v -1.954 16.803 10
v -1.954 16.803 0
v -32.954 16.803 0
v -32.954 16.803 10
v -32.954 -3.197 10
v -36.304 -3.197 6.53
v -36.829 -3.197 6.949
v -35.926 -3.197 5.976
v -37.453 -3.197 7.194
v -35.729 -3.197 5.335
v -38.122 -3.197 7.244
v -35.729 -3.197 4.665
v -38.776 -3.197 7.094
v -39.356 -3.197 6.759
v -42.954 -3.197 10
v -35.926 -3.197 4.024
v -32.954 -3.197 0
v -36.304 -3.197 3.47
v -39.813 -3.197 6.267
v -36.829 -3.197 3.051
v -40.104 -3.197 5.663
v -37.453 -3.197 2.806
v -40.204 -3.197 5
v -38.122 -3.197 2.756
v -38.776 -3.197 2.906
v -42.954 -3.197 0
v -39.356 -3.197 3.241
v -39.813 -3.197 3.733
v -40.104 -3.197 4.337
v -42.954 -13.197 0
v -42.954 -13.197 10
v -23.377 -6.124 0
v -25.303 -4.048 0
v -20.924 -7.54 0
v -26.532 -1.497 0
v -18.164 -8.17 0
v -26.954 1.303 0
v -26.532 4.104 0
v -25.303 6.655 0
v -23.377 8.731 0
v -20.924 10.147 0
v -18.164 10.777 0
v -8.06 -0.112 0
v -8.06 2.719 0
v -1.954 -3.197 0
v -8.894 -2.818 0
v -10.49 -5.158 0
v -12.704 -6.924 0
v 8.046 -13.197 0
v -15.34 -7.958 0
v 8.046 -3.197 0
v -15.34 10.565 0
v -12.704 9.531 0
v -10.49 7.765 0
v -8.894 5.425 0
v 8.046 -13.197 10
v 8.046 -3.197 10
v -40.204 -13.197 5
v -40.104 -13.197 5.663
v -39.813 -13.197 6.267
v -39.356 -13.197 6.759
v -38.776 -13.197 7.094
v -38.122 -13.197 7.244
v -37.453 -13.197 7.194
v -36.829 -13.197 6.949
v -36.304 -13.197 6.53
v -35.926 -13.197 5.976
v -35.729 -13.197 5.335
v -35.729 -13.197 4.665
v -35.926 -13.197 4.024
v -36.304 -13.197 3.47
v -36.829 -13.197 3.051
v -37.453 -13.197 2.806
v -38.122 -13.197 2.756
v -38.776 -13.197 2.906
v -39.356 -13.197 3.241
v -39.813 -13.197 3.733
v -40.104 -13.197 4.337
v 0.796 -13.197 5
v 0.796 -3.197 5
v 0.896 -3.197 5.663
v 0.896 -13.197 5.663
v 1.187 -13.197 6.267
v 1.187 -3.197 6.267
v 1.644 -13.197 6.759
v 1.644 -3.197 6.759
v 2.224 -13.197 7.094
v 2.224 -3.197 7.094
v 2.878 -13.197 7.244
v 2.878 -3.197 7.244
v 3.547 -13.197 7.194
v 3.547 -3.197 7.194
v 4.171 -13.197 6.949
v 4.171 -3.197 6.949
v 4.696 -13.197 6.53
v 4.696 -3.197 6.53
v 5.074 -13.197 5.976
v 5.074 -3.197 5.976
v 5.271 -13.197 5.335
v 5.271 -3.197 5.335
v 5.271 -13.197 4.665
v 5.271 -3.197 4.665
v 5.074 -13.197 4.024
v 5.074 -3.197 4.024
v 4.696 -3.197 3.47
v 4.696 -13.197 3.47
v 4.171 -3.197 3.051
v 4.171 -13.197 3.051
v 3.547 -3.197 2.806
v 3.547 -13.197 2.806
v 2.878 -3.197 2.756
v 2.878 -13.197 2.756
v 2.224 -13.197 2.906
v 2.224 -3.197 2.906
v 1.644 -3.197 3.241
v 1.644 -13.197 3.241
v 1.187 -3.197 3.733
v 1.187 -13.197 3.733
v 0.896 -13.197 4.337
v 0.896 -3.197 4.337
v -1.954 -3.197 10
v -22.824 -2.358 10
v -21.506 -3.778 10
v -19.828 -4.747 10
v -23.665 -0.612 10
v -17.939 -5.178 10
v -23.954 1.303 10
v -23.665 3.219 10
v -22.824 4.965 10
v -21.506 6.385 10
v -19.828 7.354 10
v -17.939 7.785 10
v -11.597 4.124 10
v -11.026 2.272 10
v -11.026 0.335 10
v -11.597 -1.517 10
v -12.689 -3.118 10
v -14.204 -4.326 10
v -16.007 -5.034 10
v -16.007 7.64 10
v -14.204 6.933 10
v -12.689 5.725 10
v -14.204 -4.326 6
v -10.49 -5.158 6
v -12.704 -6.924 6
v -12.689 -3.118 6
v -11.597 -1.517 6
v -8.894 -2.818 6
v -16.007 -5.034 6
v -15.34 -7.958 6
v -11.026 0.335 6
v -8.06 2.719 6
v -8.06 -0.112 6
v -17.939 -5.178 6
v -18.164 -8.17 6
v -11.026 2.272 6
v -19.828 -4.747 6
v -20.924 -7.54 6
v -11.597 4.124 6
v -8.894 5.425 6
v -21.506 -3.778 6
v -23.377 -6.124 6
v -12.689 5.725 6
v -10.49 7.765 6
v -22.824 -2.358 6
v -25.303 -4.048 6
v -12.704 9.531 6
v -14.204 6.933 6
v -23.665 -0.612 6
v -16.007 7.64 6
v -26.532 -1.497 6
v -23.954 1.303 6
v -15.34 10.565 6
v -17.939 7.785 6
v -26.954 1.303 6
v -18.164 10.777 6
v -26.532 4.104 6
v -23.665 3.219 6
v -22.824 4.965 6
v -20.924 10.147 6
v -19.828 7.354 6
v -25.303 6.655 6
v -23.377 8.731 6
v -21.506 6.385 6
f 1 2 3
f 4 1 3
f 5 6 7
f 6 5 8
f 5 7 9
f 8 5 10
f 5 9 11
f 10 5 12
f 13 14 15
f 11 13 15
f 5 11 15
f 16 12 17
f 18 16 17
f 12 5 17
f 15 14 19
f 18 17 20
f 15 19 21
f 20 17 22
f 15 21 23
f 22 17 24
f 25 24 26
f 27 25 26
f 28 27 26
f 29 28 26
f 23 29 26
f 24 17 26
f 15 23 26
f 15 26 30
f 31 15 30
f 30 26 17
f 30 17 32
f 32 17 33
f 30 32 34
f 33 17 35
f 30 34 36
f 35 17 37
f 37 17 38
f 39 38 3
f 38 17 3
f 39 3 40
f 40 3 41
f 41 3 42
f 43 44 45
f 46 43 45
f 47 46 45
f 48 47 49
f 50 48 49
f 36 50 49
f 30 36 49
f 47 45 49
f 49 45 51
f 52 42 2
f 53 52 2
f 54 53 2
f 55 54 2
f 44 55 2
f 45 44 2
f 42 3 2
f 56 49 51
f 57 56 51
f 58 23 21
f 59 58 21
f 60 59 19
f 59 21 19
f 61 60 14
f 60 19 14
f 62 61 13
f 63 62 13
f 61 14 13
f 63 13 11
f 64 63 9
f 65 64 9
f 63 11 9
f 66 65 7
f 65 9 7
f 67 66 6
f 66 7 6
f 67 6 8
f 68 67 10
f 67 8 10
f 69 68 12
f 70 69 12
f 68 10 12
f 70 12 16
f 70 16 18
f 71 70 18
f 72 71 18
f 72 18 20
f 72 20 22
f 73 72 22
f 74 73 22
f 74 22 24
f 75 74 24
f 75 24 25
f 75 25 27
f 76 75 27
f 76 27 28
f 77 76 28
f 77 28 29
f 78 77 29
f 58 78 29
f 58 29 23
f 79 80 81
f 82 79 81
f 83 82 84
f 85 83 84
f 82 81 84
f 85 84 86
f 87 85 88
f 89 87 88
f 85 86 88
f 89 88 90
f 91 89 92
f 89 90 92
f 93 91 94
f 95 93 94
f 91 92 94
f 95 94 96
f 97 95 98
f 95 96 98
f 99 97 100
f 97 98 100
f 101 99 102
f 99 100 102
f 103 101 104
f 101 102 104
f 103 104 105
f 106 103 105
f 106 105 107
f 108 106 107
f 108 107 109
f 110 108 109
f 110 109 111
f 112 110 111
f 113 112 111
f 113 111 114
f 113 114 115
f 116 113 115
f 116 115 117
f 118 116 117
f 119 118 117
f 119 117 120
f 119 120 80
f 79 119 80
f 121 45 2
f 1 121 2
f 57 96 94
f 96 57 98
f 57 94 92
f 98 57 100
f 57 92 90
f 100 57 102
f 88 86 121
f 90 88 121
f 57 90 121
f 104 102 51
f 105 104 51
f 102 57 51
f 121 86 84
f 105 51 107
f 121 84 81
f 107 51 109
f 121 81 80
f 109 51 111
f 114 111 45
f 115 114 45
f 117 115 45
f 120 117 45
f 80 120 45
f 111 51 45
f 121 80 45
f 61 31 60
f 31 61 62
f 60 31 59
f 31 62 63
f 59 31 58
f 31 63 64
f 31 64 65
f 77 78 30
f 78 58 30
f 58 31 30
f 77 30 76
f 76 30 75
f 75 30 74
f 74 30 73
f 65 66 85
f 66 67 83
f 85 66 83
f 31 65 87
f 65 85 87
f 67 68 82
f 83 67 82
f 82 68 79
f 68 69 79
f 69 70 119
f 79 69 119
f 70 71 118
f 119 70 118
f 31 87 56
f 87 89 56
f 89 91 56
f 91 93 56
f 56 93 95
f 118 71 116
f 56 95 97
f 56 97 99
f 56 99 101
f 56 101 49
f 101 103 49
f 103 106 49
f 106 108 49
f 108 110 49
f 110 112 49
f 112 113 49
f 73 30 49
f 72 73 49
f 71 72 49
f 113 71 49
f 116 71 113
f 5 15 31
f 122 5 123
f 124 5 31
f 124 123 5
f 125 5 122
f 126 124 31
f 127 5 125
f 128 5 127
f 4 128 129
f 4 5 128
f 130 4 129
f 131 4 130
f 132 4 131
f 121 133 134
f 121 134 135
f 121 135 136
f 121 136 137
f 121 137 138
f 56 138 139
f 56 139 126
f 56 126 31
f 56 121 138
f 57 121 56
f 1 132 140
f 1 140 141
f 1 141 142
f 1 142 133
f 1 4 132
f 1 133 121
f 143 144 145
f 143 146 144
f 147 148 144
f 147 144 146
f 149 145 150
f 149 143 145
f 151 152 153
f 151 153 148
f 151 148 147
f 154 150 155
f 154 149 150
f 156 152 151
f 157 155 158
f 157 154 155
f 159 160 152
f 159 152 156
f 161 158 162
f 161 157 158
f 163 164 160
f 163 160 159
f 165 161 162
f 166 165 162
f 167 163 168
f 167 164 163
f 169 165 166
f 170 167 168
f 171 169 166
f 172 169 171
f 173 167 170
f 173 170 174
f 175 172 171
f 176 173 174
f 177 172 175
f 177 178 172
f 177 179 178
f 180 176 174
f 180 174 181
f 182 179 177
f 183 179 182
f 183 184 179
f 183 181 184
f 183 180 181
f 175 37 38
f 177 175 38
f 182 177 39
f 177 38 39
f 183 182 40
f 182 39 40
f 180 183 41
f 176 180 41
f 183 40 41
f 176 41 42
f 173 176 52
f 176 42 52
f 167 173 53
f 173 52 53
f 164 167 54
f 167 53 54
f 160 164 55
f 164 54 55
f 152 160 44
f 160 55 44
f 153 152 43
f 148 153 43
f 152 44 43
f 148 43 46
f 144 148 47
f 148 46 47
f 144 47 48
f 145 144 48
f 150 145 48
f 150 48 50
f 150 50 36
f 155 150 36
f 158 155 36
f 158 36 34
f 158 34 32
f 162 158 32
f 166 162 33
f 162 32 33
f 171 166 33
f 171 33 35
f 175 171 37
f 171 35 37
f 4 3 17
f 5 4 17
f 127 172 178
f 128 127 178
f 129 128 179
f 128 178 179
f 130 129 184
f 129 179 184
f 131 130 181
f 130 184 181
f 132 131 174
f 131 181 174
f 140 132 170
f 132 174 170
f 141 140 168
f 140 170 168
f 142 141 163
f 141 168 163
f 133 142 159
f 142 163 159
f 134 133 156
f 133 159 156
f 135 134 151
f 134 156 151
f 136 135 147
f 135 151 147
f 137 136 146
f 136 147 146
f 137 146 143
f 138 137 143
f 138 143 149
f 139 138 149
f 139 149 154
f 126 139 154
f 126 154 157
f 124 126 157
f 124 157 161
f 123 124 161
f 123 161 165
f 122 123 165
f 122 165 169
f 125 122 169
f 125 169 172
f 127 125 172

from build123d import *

# Parameters (mm, degrees)
BOSS_EXTRUDE1_DEPTH = 10
SKETCH5_R           = 6.5
CUT_EXTRUDE1_DEPTH  = 10
SKETCH7_R           = 9.5
CUT_EXTRUDE2_DEPTH  = 6
SKETCH8_R           = 2.25
CUT_EXTRUDE3_DEPTH  = 15


with BuildPart() as part:
    # Sketch1 → Boss-Extrude1 (new body)
    with BuildSketch(Plane.XY):
        Polygon((-42.953588015, -13.19658427), (8.046411985, -13.19658427), (8.046411985, -3.19658427), (-1.953588015, -3.19658427), (-1.953588015, 16.80341573), (-32.953588015, 16.80341573), (-32.953588015, -3.19658427), (-42.953588015, -3.19658427), align=None)
    extrude(amount=BOSS_EXTRUDE1_DEPTH)

    # Sketch5 → Cut-Extrude1 (cut)
    with BuildSketch(Plane(origin=(0, 0, 0), x_dir=(-1, 0, 0), z_dir=(0, 0, -1))):
        with Locations((17.453588015, 1.30341573)):
            Circle(SKETCH5_R)
    extrude(amount=-CUT_EXTRUDE1_DEPTH, mode=Mode.SUBTRACT)

    # Sketch7 → Cut-Extrude2 (cut)
    with BuildSketch(Plane(origin=(0, 0, 0), x_dir=(-1, 0, 0), z_dir=(0, 0, -1))):
        with Locations((17.453588015, 1.30341573)):
            Circle(SKETCH7_R)
    extrude(amount=-CUT_EXTRUDE2_DEPTH, mode=Mode.SUBTRACT)

    # Sketch8 → Cut-Extrude3 (cut)
    with BuildSketch(Plane(origin=(0, -3.19658427, 0), x_dir=(1, 0, 0), z_dir=(0, 1, 0))):
        with Locations(Location((3.046411985, -5, 0), (0, 0, 180))):
            Circle(SKETCH8_R)
        with Locations(Location((-37.953588015, -5, 0), (0, 0, 180))):
            Circle(SKETCH8_R)
    extrude(amount=-CUT_EXTRUDE3_DEPTH, mode=Mode.SUBTRACT)


solid = part.part
